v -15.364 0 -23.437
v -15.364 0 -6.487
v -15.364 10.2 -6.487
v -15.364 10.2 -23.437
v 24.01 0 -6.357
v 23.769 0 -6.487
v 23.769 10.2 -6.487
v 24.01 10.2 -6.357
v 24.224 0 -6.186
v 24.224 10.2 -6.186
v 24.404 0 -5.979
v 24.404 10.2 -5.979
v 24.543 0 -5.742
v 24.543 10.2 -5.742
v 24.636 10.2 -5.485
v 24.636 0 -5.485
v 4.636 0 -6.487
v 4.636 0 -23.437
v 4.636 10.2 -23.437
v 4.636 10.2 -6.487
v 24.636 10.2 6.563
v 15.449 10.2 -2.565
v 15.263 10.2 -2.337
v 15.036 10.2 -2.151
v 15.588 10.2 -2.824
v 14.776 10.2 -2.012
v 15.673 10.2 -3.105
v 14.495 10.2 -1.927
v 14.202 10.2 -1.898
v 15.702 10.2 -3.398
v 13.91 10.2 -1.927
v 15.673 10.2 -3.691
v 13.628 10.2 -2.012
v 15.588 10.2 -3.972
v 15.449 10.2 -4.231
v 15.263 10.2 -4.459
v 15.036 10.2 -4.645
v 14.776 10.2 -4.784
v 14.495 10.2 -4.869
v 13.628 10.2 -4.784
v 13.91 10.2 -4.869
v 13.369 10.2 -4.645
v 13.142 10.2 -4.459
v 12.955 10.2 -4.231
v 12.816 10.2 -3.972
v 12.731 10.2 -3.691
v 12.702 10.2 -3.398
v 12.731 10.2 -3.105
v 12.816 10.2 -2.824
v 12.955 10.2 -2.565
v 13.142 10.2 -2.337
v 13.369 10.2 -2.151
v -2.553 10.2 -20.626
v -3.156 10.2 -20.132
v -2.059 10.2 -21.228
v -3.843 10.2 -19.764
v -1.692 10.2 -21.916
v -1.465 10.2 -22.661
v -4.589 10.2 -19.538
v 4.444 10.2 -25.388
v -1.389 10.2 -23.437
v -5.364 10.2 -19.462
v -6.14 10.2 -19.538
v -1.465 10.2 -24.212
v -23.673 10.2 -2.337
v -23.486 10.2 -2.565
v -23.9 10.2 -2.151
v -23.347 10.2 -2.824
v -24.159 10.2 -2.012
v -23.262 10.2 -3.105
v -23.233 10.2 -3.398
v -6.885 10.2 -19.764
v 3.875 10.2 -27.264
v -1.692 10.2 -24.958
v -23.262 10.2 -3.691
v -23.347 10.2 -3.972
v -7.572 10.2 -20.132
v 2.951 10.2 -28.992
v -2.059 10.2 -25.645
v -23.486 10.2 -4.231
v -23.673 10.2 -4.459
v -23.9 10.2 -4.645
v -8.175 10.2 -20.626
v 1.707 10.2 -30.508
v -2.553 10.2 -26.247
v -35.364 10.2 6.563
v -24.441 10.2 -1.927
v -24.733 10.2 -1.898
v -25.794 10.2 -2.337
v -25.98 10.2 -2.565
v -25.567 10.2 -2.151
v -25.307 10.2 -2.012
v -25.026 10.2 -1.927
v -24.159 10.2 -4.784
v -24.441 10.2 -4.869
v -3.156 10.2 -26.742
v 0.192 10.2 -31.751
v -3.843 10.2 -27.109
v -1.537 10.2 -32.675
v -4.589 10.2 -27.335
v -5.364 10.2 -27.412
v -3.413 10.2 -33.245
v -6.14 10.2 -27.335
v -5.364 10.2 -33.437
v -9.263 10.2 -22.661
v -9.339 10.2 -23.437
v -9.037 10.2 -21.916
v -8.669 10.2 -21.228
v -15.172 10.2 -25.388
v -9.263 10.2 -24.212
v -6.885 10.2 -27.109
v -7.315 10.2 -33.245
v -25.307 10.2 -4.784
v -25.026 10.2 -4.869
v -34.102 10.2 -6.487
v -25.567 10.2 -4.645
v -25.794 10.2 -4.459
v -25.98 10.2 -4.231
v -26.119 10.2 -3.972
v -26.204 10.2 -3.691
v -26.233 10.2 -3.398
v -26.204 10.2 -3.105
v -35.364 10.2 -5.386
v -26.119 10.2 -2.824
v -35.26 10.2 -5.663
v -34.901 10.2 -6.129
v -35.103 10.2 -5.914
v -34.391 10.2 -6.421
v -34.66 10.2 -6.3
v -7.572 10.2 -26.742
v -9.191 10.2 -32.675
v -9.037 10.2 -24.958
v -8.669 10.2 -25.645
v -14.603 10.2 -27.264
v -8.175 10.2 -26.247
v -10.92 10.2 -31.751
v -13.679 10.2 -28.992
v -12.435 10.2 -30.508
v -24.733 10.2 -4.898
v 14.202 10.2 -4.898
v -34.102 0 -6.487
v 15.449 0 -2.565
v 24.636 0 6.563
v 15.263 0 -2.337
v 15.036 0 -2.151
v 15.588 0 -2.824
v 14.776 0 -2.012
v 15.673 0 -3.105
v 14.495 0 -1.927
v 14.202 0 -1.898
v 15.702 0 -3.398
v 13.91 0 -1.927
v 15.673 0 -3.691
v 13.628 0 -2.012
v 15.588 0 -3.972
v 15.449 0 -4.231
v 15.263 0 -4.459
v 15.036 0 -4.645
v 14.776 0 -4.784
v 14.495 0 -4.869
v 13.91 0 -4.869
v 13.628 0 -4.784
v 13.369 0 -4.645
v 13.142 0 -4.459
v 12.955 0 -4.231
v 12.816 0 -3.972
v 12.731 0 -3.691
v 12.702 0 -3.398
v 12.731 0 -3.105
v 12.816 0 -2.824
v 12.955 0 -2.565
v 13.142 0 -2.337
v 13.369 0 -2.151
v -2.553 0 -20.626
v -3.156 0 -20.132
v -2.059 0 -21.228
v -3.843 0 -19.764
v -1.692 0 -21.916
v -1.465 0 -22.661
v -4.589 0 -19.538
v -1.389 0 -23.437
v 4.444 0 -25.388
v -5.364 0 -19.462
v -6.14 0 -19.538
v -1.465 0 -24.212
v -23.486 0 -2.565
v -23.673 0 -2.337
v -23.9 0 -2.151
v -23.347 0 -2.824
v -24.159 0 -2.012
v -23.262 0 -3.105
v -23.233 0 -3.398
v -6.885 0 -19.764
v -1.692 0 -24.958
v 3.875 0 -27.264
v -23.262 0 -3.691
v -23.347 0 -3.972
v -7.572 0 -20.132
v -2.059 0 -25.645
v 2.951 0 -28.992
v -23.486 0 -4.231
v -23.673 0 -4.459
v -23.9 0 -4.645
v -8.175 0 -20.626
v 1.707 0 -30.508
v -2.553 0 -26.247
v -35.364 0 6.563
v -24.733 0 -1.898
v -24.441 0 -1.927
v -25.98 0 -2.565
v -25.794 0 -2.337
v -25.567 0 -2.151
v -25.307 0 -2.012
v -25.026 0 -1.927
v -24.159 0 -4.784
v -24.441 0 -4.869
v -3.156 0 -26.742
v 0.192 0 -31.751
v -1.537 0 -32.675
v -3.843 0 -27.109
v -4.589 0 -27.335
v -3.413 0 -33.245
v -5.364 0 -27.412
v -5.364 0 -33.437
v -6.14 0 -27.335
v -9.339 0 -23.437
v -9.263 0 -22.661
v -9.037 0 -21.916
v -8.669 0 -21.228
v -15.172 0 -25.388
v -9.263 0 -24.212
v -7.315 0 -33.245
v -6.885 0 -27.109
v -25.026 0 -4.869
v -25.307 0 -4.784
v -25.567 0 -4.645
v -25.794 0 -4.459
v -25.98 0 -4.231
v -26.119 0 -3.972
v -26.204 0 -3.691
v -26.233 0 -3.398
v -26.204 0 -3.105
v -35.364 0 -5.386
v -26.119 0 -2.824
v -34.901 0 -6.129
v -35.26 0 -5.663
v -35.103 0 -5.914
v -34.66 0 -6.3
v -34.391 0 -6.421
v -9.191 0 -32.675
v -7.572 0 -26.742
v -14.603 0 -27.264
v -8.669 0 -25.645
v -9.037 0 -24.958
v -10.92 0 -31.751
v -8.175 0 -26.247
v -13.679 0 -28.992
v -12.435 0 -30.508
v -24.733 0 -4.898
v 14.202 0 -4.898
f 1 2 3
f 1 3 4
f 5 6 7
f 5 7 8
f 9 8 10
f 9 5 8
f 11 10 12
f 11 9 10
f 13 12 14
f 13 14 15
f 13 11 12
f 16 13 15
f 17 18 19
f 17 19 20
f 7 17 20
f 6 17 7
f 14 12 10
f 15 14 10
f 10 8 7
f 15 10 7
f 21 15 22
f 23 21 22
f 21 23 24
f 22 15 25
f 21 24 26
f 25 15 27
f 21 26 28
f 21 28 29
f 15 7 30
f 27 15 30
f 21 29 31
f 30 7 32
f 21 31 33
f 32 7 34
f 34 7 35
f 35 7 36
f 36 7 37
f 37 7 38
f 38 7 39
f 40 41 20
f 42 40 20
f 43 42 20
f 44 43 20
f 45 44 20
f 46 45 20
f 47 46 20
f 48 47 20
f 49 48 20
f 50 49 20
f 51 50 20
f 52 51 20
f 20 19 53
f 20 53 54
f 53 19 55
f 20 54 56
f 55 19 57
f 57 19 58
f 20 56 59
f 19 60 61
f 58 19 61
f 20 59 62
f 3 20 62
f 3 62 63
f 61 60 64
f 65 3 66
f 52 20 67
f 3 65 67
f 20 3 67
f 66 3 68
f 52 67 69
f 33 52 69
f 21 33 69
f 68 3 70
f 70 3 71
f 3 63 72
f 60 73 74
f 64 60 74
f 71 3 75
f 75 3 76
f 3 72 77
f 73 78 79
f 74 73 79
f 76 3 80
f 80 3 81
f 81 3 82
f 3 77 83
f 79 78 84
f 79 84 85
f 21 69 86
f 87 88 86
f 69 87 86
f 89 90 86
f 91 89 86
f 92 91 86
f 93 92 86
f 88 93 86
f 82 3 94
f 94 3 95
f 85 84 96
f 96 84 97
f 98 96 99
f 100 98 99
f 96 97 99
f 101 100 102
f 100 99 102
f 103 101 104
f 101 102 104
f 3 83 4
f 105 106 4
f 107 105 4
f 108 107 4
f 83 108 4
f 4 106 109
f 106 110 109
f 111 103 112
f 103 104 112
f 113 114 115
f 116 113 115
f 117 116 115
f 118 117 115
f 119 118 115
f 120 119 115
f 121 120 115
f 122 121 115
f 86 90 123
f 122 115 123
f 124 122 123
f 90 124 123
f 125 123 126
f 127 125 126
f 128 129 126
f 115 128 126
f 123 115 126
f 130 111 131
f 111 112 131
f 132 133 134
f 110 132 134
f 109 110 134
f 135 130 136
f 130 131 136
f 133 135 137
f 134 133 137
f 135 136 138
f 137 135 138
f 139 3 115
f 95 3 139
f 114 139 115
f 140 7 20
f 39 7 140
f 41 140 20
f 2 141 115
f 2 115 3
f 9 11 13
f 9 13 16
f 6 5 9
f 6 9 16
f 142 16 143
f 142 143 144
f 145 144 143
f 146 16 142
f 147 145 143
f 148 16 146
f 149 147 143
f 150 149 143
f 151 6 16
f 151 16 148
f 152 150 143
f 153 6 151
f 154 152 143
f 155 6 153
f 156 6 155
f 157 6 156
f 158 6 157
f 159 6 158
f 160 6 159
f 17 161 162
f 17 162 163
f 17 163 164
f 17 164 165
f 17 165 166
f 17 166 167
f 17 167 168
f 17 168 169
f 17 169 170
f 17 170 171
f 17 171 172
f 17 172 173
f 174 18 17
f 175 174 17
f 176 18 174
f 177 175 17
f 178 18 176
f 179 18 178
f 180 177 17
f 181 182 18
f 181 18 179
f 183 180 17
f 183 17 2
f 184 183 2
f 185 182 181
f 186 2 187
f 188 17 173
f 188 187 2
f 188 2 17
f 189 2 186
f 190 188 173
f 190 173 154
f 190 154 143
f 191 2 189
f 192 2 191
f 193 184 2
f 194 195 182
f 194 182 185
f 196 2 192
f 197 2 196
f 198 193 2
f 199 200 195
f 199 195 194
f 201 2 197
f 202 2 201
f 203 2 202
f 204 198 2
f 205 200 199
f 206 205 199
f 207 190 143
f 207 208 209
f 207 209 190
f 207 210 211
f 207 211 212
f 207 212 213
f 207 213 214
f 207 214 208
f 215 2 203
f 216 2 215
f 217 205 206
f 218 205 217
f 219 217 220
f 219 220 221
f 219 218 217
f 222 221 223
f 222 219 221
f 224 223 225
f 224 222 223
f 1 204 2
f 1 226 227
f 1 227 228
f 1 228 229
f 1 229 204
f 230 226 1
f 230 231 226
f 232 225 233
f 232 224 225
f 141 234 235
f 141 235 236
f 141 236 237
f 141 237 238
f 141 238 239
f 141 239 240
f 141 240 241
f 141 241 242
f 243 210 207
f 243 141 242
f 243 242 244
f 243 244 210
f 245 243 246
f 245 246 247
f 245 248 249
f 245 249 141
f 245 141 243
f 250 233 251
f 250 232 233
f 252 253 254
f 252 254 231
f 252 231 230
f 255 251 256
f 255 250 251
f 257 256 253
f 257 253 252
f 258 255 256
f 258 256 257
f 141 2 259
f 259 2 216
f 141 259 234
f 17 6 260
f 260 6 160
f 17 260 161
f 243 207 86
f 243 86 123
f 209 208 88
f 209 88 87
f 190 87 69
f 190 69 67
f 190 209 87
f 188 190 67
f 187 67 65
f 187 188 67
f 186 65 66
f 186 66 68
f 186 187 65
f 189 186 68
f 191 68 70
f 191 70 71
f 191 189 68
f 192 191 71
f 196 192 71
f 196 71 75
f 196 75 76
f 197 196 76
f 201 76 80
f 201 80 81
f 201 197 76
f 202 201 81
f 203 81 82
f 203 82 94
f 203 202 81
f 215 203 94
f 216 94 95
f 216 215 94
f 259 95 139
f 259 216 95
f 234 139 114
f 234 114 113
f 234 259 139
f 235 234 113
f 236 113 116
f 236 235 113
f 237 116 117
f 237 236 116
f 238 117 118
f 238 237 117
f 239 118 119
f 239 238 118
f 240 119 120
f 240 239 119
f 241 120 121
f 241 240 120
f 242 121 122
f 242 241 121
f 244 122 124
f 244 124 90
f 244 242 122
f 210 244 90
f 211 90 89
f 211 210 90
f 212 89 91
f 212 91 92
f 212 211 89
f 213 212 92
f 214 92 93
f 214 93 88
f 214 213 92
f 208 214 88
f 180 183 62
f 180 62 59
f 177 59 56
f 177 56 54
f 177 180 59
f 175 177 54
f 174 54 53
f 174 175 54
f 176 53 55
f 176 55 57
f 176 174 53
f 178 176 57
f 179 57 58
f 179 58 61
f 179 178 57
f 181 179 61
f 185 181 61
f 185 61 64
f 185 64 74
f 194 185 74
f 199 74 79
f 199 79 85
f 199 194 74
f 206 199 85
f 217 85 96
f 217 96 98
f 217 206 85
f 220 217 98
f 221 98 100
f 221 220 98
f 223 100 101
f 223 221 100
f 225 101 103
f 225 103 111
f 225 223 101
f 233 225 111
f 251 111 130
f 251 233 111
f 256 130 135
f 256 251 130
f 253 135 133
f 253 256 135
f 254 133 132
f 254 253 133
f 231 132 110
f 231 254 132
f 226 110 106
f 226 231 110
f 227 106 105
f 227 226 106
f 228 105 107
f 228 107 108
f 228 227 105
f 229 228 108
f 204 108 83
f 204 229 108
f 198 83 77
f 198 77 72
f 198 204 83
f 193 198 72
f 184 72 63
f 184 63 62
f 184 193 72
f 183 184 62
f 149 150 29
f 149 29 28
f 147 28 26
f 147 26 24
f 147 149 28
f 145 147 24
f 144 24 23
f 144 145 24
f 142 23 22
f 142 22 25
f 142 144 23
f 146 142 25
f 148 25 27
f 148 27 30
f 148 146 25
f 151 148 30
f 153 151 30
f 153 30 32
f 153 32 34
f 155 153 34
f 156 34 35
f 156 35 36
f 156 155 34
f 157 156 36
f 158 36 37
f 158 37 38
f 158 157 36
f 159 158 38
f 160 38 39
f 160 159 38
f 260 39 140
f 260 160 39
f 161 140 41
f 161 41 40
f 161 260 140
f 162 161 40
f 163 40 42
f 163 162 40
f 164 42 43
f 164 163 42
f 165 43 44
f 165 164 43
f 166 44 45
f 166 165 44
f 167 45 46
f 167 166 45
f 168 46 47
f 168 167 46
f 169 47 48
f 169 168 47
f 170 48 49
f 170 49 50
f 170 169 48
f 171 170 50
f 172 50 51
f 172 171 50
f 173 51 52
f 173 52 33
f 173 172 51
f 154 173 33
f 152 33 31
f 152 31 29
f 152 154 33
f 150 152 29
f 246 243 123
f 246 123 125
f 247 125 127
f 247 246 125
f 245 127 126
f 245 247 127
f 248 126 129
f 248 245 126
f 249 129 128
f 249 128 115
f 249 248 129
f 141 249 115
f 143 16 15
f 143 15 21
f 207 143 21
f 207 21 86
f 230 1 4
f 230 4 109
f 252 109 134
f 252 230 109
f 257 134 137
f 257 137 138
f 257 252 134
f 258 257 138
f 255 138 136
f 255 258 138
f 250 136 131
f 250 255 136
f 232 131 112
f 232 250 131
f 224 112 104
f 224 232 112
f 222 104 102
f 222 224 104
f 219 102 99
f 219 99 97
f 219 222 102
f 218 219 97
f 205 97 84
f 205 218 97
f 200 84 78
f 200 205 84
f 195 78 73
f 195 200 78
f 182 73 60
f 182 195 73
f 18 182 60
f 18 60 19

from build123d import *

# Parameters (mm, degrees)
CROQUIS1_R              = 3.975
CROQUIS1_R_2            = 1.5
SALIENTE_EXTRUIR1_DEPTH = 10.2


with BuildPart() as part:
    # Croquis1 → Saliente-Extruir1 (new body)
    with BuildSketch(Plane(origin=(0, 0, 0), x_dir=(1, 0, 0), z_dir=(0, 1, 0))):
        with BuildLine():
            Line((-34.10243875, 6.486534721), (-15.364079564, 6.486534721))
            Line((-15.364079564, 6.486534721), (-15.364079564, 23.436691068))
            ThreePointArc((-15.364079564, 23.436691068), (-5.364079564, 33.436691068), (4.635920436, 23.436691068))
            Line((4.635920436, 23.436691068), (4.635920436, 6.486534721))
            Line((4.635920436, 6.486534721), (23.768585867, 6.486534721))
            ThreePointArc((23.768585867, 6.486534721), (24.318891967, 6.08655714), (24.635920436, 5.484633707))
            Line((24.635920436, 5.484633707), (24.635920436, -6.563308932))
            Line((24.635920436, -6.563308932), (-35.364079564, -6.563308932))
            Line((-35.364079564, -6.563308932), (-35.364079564, 5.386400848))
            ThreePointArc((-35.364079564, 5.386400848), (-34.900990267, 6.128822933), (-34.10243875, 6.486534721))
        make_face()
        with Locations(Location((-5.364079564, 23.436691068, 0), (0, 0, 270))):
            Circle(CROQUIS1_R, mode=Mode.SUBTRACT)
        with Locations(Location((-24.733259157, 3.398021726, 0), (0, 0, 270))):
            Circle(CROQUIS1_R_2, mode=Mode.SUBTRACT)
        with Locations(Location((14.202253152, 3.398021726, 0), (0, 0, 270))):
            Circle(CROQUIS1_R_2, mode=Mode.SUBTRACT)
    extrude(amount=SALIENTE_EXTRUIR1_DEPTH)


solid = part.part
